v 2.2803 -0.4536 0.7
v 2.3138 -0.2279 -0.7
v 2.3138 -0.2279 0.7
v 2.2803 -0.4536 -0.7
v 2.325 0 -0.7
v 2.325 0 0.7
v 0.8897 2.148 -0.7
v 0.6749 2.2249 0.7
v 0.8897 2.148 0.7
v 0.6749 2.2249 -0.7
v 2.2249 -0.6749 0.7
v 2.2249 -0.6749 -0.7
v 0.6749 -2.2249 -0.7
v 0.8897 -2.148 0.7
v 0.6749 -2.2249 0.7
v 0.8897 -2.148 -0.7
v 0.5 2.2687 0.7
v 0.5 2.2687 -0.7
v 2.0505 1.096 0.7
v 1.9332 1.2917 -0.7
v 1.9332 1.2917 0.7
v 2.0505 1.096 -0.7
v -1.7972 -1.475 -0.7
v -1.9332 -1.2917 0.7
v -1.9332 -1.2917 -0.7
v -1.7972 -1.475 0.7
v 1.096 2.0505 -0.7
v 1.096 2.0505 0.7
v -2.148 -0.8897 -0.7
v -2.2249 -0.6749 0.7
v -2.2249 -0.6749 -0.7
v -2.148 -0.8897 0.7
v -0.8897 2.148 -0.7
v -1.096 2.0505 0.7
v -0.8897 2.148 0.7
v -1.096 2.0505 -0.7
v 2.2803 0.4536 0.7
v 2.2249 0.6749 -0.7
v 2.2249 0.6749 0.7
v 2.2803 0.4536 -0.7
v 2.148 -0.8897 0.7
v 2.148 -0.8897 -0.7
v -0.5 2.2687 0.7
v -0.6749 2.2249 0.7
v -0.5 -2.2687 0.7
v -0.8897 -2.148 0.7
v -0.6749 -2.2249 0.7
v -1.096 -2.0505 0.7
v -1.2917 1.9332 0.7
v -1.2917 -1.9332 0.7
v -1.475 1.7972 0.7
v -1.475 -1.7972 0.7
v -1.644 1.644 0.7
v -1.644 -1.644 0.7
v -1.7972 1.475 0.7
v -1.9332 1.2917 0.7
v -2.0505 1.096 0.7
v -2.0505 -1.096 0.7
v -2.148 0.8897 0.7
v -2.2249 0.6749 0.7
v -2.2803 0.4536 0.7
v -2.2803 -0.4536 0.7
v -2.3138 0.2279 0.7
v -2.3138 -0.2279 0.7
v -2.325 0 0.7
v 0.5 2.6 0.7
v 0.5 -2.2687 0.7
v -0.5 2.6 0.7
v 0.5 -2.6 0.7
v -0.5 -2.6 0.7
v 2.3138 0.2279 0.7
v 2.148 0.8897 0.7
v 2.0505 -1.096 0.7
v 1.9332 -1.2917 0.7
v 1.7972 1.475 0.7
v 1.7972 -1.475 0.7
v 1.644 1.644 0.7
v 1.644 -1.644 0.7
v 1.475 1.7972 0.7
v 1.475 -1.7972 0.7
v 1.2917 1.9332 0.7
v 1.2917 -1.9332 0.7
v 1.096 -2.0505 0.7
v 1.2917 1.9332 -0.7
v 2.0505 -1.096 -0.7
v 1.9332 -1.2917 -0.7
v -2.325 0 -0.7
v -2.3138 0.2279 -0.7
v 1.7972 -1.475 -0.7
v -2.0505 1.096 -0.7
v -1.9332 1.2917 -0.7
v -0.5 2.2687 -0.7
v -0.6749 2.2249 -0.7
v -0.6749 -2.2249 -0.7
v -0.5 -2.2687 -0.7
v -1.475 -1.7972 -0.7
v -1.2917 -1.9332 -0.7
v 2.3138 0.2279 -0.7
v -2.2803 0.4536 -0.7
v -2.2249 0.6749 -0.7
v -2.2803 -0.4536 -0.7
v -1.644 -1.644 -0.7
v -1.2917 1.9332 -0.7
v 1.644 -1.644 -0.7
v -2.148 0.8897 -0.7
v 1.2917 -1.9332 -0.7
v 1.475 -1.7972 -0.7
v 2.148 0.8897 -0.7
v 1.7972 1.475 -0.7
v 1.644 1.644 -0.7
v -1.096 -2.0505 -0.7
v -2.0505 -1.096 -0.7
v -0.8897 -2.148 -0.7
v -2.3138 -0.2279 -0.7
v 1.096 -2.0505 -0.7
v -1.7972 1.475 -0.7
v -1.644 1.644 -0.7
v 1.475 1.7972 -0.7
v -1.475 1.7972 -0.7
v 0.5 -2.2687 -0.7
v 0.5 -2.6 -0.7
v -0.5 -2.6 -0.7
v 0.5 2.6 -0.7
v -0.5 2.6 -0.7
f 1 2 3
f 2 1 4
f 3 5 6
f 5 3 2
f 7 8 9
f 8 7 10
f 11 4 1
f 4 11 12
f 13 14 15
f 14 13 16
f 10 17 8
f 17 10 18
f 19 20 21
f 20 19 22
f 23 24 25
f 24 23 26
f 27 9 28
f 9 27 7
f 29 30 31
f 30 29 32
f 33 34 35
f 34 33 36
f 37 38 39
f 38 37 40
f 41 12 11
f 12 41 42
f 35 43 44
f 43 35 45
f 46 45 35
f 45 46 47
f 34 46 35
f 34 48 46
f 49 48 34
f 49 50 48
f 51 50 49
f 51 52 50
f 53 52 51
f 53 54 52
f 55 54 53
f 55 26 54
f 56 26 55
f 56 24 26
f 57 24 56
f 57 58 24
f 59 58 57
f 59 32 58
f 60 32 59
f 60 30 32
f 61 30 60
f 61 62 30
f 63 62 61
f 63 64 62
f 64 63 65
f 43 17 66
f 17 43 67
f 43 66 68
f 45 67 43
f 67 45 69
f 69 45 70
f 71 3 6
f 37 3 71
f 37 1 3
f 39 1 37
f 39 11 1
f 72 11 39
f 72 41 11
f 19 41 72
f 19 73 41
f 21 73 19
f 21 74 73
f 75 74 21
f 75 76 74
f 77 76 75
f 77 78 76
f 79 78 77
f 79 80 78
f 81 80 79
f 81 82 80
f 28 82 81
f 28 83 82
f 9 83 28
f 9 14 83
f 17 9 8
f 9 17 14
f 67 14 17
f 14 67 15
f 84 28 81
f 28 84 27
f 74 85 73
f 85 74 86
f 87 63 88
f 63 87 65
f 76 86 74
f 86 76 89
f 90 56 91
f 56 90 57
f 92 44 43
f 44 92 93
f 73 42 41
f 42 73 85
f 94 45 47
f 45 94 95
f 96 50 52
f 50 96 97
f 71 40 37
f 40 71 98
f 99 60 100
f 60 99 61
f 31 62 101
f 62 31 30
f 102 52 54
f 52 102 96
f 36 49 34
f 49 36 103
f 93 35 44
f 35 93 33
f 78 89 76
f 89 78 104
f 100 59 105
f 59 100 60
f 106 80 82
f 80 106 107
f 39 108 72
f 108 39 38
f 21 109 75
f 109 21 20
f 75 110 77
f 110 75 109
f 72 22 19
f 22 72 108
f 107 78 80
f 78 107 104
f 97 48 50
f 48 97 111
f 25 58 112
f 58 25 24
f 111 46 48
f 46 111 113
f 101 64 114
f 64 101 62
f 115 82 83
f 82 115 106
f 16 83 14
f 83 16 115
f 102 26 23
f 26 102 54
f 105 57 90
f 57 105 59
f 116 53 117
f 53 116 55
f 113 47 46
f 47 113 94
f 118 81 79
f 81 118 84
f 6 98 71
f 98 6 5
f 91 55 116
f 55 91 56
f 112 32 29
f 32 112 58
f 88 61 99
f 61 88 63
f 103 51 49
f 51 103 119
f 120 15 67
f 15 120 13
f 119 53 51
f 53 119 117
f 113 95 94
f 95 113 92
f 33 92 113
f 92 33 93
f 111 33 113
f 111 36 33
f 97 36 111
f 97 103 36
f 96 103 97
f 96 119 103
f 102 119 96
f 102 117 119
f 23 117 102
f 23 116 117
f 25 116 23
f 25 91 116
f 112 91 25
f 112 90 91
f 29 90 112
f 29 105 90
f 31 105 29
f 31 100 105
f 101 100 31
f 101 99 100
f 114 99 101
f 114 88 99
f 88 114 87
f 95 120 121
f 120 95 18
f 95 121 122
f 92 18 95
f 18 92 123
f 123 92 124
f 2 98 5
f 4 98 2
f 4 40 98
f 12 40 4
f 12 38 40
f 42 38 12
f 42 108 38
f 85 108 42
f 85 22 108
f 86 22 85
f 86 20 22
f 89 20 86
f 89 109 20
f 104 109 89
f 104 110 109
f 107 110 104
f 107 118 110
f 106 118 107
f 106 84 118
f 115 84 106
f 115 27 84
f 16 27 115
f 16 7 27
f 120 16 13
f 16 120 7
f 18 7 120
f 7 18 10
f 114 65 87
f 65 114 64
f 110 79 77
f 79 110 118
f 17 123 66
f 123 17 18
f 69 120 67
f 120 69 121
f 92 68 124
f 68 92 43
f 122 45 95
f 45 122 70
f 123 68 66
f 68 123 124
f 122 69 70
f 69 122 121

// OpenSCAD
// Start: lazy_union
default_5_default_5();
// End: lazy_union

// Modules.

// 'PartMaterial undef-default - default 5.0'
module default_5_default_5() {
  // 'None : _combine_solids_and_holes'
  union() {
    // 'default : _combine_solids_and_holes'
    union() {
      // 'plunger'
      multmatrix(m=[[1.0, 0.0, 0.0, 0.0], [-0.0, -1.0, -0.0, -0.0], [-0.0, -0.0, -1.0, 0.7], [0.0, 0.0, 0.0, 1.0]]) {
        // 'plunger : _combine_solids_and_holes'
        union() {
          // 'plunger'
          cylinder(h=1.4, r1=2.325, r2=2.325, center=false, $fn=64);
        }
      }
      // 'tab'
      multmatrix(m=[[1.0, 0.0, 0.0, -0.5], [0.0, 1.0, 0.0, -2.6], [0.0, 0.0, 1.0, -0.7], [0.0, 0.0, 0.0, 1.0]]) {
        // 'tab : _combine_solids_and_holes'
        union() {
          // 'tab'
          cube(size=[1.0, 5.2, 1.4]);
        }
      }
    }
  }
} // end module default_5_default_5
